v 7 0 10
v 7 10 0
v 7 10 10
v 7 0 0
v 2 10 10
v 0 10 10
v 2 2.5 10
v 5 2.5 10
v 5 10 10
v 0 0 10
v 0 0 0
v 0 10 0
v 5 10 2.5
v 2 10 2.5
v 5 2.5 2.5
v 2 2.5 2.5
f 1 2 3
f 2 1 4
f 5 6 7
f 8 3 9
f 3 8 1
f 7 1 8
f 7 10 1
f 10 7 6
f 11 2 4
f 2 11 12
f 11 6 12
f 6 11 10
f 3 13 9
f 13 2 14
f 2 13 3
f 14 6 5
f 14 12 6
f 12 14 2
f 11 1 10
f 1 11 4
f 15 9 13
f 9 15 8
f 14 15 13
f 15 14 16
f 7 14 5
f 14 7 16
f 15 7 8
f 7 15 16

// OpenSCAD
difference(){
translate ([0,0,0]) cube ([7,10,10]);
translate ([2,2.5,2.5]) cube ([3,15,15]);
}
